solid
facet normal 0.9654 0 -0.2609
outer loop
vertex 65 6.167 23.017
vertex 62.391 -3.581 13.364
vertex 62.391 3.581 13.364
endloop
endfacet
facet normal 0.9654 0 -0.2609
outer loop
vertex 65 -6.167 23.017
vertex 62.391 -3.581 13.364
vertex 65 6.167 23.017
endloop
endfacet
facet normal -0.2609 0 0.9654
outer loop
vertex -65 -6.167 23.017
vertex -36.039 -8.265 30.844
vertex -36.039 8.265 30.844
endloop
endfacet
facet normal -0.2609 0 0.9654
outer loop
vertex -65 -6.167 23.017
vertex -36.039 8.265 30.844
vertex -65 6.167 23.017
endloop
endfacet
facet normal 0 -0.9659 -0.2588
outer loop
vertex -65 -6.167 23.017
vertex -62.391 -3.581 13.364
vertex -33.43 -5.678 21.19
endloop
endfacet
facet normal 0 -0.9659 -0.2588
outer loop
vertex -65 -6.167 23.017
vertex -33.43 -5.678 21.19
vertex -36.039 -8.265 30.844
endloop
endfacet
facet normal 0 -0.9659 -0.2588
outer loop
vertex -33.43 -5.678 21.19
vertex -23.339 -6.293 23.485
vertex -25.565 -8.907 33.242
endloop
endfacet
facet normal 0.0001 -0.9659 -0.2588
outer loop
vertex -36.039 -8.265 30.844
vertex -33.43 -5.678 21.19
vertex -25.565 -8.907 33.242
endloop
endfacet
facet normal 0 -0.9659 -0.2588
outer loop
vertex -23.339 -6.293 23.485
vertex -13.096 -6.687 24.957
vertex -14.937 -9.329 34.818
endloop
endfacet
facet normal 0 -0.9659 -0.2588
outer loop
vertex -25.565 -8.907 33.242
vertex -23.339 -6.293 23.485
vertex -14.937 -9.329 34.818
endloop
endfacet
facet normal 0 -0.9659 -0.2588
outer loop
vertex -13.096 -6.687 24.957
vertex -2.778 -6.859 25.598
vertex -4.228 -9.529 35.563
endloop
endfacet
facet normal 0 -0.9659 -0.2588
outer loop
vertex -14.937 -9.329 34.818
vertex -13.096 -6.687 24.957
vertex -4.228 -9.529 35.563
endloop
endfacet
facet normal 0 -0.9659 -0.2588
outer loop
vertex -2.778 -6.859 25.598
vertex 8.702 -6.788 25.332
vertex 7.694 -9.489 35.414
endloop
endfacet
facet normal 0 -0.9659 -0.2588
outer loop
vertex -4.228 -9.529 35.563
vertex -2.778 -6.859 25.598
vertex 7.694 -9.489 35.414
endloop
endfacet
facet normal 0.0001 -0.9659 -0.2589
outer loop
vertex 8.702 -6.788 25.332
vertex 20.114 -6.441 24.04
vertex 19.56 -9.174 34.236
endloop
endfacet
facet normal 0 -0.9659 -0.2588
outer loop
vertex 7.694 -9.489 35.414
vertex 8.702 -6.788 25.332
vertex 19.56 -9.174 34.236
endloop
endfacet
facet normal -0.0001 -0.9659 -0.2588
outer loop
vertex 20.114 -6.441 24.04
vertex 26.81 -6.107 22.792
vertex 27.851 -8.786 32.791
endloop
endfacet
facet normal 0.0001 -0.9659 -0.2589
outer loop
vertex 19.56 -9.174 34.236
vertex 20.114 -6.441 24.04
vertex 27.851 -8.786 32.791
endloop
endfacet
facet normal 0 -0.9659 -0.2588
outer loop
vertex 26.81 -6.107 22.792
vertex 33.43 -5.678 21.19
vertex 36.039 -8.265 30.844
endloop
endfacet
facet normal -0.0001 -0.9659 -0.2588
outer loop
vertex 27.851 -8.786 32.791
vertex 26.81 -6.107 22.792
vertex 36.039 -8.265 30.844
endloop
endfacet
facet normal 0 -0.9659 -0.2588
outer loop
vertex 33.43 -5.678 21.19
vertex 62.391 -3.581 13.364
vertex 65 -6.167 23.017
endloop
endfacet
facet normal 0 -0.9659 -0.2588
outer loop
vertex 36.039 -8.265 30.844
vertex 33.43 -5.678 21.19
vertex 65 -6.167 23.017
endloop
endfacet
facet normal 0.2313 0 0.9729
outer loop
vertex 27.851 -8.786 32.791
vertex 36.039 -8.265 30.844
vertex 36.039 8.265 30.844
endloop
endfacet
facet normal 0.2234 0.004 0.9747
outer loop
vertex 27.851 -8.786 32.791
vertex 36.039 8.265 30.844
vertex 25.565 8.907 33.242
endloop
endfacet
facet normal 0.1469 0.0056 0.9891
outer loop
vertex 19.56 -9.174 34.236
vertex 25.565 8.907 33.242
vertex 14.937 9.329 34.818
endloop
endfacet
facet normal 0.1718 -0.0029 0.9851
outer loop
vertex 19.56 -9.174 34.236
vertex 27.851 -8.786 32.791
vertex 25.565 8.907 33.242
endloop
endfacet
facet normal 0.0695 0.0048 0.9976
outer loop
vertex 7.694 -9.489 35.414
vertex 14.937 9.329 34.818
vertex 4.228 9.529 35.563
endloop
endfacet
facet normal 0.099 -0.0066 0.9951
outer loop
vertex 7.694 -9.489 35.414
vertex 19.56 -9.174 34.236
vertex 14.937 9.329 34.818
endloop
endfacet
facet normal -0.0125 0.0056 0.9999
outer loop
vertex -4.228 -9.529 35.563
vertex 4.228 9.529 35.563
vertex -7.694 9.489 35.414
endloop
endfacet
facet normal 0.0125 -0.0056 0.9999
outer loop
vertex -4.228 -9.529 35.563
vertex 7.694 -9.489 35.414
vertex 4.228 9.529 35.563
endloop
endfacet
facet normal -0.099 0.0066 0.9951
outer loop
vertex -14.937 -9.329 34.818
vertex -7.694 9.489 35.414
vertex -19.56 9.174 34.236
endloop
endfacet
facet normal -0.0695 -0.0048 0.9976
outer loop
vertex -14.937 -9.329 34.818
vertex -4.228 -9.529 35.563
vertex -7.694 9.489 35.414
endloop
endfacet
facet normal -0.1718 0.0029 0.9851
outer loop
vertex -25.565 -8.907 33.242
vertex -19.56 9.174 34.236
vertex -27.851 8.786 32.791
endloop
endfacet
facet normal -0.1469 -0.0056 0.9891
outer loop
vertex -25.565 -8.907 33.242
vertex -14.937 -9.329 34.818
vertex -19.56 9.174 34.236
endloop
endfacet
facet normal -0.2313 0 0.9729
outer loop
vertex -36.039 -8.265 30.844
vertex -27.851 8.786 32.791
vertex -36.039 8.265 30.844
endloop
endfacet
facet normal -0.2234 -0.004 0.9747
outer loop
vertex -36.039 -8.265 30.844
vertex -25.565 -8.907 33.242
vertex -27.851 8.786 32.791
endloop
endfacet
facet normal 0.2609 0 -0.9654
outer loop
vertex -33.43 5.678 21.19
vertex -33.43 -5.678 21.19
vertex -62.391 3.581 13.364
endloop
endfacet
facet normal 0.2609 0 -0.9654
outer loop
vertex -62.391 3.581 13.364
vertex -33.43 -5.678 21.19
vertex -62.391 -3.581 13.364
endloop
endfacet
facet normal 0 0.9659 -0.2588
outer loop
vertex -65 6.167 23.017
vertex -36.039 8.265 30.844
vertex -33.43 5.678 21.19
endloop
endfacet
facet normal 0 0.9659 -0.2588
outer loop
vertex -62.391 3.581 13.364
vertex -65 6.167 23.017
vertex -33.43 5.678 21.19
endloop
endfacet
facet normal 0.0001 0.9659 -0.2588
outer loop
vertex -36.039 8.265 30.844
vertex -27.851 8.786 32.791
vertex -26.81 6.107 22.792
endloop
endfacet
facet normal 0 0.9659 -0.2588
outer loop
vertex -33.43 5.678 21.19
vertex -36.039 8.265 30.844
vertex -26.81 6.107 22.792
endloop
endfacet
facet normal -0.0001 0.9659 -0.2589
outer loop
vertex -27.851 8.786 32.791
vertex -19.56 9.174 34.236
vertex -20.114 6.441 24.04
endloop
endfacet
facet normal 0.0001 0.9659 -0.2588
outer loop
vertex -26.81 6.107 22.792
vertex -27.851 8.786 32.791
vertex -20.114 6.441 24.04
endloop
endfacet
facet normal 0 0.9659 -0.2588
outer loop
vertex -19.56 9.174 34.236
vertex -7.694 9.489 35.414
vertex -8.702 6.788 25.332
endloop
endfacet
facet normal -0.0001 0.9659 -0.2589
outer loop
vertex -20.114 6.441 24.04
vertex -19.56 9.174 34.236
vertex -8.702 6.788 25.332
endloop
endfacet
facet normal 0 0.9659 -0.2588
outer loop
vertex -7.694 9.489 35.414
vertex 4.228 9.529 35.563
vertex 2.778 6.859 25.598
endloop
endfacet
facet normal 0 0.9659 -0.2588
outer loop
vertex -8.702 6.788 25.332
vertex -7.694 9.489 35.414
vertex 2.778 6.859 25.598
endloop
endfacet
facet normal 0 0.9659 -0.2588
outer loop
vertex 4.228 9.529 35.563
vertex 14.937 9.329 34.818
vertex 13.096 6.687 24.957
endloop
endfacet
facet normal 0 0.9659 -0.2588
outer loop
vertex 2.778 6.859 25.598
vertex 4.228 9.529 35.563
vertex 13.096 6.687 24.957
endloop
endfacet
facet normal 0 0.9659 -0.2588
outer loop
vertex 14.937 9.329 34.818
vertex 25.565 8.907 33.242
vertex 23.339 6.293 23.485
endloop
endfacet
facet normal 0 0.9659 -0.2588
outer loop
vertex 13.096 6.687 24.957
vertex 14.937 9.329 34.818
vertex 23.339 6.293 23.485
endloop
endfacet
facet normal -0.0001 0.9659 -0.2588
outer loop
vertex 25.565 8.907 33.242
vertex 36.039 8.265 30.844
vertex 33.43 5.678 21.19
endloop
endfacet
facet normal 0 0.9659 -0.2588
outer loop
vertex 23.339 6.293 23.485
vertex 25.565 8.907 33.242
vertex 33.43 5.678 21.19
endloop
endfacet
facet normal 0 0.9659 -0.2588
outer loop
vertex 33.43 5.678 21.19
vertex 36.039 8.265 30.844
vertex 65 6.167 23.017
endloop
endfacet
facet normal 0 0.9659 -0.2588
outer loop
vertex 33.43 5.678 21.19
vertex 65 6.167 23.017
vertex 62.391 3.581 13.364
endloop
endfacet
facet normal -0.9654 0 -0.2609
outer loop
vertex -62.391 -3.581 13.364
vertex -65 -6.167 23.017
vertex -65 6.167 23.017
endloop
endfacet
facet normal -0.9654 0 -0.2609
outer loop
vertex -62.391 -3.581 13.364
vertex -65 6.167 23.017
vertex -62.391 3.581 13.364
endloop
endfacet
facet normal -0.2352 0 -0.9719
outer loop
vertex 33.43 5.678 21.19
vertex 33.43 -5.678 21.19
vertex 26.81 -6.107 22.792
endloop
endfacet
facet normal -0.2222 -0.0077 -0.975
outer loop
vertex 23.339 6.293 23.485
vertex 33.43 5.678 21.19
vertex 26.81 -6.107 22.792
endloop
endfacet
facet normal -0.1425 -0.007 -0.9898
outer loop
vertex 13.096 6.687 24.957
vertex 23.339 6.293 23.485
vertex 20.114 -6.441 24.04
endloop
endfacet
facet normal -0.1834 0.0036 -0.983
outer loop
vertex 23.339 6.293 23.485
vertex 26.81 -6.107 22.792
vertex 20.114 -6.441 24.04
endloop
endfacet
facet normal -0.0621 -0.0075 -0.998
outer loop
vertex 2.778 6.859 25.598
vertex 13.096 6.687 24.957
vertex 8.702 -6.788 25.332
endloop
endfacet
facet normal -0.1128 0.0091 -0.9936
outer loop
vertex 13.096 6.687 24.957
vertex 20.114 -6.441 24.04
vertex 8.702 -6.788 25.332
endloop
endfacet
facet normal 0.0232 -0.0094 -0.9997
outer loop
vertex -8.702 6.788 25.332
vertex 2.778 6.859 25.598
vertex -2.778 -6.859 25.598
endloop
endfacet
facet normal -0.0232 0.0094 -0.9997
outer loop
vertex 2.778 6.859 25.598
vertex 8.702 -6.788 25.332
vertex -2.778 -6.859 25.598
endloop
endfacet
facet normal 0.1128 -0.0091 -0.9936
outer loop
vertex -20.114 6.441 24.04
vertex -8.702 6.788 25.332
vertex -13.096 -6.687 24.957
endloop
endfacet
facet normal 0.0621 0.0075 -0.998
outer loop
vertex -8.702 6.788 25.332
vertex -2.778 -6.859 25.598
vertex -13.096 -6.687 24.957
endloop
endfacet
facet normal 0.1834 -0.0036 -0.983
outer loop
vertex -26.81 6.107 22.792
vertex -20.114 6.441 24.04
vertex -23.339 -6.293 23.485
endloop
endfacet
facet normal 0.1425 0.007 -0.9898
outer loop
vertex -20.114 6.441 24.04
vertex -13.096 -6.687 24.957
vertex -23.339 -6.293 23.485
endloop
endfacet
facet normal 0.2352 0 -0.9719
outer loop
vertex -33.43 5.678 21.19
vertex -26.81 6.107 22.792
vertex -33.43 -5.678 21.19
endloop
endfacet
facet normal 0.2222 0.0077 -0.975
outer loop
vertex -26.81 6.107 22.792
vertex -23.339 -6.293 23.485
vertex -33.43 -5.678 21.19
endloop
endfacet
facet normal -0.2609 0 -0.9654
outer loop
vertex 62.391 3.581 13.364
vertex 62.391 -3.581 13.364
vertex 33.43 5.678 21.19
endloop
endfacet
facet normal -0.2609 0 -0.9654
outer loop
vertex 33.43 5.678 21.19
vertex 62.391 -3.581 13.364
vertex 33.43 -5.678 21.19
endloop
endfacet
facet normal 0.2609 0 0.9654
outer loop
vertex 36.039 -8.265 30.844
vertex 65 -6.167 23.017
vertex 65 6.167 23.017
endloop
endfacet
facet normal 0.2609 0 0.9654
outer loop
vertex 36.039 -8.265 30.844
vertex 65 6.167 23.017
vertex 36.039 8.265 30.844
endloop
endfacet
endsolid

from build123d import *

# Parameters (mm, degrees)
F1_DEPTH = 15
F3_DEPTH = 100
F5_DEPTH = 25


with BuildPart() as f1:
    # F0 (on Front) → F1 (new body, symmetric)
    with BuildSketch(Plane.XZ):
        with BuildLine():
            ThreePointArc((-32.9082667369, 19.25967), (0, 23.6280366002), (32.9082667369, 19.25967))
            Line((32.9082667369, 19.25967), (61.8693159107, 11.43296))
            Line((61.8693159107, 11.43296), (65, 23.01738))
            Line((65, 23.01738), (36.0389508262, 30.84409))
            ThreePointArc((36.0389508262, 30.84409), (0, 35.6280353337), (-36.0389508262, 30.84409))
            Line((-36.0389508262, 30.84409), (-65, 23.01738))
            Line((-65, 23.01738), (-61.8693159107, 11.43296))
            Line((-61.8693159107, 11.43296), (-32.9082667369, 19.25967))
        make_face()
    extrude(amount=F1_DEPTH, both=True)

    # F2 (on Right) → F3 (cut, symmetric)
    with BuildSketch(Plane.YZ):
        Polygon((-1.875644347, 7), (-17, 63.4448637287), (-17, 0), (0, 0), (17, 0), (17, 63.4448637287), (1.875644347, 7), align=None)
    extrude(amount=F3_DEPTH, both=True, mode=Mode.SUBTRACT)

    # F4 (on Front) → F5 (cut, symmetric)
    with BuildSketch(Plane.XZ):
        with BuildLine():
            Line((62.3910966473, 13.3636968704), (33.4300474735, 21.1904068704))
            ThreePointArc((33.4300474735, 21.1904068704), (0, 25.6280366002), (-33.4300474735, 21.1904068704))
            Line((-33.4300474735, 21.1904068704), (-62.3910966473, 13.3636968704))
            Line((-62.3910966473, 13.3636968704), (-61.8693159107, 11.43296))
            Line((-61.8693159107, 11.43296), (-32.9082667369, 19.25967))
            ThreePointArc((-32.9082667369, 19.25967), (0, 23.6280366002), (32.9082667369, 19.25967))
            Line((32.9082667369, 19.25967), (61.8693159107, 11.43296))
            Line((61.8693159107, 11.43296), (62.3910966473, 13.3636968704))
        make_face()
    extrude(amount=F5_DEPTH, both=True, mode=Mode.SUBTRACT)


solid = f1.part
